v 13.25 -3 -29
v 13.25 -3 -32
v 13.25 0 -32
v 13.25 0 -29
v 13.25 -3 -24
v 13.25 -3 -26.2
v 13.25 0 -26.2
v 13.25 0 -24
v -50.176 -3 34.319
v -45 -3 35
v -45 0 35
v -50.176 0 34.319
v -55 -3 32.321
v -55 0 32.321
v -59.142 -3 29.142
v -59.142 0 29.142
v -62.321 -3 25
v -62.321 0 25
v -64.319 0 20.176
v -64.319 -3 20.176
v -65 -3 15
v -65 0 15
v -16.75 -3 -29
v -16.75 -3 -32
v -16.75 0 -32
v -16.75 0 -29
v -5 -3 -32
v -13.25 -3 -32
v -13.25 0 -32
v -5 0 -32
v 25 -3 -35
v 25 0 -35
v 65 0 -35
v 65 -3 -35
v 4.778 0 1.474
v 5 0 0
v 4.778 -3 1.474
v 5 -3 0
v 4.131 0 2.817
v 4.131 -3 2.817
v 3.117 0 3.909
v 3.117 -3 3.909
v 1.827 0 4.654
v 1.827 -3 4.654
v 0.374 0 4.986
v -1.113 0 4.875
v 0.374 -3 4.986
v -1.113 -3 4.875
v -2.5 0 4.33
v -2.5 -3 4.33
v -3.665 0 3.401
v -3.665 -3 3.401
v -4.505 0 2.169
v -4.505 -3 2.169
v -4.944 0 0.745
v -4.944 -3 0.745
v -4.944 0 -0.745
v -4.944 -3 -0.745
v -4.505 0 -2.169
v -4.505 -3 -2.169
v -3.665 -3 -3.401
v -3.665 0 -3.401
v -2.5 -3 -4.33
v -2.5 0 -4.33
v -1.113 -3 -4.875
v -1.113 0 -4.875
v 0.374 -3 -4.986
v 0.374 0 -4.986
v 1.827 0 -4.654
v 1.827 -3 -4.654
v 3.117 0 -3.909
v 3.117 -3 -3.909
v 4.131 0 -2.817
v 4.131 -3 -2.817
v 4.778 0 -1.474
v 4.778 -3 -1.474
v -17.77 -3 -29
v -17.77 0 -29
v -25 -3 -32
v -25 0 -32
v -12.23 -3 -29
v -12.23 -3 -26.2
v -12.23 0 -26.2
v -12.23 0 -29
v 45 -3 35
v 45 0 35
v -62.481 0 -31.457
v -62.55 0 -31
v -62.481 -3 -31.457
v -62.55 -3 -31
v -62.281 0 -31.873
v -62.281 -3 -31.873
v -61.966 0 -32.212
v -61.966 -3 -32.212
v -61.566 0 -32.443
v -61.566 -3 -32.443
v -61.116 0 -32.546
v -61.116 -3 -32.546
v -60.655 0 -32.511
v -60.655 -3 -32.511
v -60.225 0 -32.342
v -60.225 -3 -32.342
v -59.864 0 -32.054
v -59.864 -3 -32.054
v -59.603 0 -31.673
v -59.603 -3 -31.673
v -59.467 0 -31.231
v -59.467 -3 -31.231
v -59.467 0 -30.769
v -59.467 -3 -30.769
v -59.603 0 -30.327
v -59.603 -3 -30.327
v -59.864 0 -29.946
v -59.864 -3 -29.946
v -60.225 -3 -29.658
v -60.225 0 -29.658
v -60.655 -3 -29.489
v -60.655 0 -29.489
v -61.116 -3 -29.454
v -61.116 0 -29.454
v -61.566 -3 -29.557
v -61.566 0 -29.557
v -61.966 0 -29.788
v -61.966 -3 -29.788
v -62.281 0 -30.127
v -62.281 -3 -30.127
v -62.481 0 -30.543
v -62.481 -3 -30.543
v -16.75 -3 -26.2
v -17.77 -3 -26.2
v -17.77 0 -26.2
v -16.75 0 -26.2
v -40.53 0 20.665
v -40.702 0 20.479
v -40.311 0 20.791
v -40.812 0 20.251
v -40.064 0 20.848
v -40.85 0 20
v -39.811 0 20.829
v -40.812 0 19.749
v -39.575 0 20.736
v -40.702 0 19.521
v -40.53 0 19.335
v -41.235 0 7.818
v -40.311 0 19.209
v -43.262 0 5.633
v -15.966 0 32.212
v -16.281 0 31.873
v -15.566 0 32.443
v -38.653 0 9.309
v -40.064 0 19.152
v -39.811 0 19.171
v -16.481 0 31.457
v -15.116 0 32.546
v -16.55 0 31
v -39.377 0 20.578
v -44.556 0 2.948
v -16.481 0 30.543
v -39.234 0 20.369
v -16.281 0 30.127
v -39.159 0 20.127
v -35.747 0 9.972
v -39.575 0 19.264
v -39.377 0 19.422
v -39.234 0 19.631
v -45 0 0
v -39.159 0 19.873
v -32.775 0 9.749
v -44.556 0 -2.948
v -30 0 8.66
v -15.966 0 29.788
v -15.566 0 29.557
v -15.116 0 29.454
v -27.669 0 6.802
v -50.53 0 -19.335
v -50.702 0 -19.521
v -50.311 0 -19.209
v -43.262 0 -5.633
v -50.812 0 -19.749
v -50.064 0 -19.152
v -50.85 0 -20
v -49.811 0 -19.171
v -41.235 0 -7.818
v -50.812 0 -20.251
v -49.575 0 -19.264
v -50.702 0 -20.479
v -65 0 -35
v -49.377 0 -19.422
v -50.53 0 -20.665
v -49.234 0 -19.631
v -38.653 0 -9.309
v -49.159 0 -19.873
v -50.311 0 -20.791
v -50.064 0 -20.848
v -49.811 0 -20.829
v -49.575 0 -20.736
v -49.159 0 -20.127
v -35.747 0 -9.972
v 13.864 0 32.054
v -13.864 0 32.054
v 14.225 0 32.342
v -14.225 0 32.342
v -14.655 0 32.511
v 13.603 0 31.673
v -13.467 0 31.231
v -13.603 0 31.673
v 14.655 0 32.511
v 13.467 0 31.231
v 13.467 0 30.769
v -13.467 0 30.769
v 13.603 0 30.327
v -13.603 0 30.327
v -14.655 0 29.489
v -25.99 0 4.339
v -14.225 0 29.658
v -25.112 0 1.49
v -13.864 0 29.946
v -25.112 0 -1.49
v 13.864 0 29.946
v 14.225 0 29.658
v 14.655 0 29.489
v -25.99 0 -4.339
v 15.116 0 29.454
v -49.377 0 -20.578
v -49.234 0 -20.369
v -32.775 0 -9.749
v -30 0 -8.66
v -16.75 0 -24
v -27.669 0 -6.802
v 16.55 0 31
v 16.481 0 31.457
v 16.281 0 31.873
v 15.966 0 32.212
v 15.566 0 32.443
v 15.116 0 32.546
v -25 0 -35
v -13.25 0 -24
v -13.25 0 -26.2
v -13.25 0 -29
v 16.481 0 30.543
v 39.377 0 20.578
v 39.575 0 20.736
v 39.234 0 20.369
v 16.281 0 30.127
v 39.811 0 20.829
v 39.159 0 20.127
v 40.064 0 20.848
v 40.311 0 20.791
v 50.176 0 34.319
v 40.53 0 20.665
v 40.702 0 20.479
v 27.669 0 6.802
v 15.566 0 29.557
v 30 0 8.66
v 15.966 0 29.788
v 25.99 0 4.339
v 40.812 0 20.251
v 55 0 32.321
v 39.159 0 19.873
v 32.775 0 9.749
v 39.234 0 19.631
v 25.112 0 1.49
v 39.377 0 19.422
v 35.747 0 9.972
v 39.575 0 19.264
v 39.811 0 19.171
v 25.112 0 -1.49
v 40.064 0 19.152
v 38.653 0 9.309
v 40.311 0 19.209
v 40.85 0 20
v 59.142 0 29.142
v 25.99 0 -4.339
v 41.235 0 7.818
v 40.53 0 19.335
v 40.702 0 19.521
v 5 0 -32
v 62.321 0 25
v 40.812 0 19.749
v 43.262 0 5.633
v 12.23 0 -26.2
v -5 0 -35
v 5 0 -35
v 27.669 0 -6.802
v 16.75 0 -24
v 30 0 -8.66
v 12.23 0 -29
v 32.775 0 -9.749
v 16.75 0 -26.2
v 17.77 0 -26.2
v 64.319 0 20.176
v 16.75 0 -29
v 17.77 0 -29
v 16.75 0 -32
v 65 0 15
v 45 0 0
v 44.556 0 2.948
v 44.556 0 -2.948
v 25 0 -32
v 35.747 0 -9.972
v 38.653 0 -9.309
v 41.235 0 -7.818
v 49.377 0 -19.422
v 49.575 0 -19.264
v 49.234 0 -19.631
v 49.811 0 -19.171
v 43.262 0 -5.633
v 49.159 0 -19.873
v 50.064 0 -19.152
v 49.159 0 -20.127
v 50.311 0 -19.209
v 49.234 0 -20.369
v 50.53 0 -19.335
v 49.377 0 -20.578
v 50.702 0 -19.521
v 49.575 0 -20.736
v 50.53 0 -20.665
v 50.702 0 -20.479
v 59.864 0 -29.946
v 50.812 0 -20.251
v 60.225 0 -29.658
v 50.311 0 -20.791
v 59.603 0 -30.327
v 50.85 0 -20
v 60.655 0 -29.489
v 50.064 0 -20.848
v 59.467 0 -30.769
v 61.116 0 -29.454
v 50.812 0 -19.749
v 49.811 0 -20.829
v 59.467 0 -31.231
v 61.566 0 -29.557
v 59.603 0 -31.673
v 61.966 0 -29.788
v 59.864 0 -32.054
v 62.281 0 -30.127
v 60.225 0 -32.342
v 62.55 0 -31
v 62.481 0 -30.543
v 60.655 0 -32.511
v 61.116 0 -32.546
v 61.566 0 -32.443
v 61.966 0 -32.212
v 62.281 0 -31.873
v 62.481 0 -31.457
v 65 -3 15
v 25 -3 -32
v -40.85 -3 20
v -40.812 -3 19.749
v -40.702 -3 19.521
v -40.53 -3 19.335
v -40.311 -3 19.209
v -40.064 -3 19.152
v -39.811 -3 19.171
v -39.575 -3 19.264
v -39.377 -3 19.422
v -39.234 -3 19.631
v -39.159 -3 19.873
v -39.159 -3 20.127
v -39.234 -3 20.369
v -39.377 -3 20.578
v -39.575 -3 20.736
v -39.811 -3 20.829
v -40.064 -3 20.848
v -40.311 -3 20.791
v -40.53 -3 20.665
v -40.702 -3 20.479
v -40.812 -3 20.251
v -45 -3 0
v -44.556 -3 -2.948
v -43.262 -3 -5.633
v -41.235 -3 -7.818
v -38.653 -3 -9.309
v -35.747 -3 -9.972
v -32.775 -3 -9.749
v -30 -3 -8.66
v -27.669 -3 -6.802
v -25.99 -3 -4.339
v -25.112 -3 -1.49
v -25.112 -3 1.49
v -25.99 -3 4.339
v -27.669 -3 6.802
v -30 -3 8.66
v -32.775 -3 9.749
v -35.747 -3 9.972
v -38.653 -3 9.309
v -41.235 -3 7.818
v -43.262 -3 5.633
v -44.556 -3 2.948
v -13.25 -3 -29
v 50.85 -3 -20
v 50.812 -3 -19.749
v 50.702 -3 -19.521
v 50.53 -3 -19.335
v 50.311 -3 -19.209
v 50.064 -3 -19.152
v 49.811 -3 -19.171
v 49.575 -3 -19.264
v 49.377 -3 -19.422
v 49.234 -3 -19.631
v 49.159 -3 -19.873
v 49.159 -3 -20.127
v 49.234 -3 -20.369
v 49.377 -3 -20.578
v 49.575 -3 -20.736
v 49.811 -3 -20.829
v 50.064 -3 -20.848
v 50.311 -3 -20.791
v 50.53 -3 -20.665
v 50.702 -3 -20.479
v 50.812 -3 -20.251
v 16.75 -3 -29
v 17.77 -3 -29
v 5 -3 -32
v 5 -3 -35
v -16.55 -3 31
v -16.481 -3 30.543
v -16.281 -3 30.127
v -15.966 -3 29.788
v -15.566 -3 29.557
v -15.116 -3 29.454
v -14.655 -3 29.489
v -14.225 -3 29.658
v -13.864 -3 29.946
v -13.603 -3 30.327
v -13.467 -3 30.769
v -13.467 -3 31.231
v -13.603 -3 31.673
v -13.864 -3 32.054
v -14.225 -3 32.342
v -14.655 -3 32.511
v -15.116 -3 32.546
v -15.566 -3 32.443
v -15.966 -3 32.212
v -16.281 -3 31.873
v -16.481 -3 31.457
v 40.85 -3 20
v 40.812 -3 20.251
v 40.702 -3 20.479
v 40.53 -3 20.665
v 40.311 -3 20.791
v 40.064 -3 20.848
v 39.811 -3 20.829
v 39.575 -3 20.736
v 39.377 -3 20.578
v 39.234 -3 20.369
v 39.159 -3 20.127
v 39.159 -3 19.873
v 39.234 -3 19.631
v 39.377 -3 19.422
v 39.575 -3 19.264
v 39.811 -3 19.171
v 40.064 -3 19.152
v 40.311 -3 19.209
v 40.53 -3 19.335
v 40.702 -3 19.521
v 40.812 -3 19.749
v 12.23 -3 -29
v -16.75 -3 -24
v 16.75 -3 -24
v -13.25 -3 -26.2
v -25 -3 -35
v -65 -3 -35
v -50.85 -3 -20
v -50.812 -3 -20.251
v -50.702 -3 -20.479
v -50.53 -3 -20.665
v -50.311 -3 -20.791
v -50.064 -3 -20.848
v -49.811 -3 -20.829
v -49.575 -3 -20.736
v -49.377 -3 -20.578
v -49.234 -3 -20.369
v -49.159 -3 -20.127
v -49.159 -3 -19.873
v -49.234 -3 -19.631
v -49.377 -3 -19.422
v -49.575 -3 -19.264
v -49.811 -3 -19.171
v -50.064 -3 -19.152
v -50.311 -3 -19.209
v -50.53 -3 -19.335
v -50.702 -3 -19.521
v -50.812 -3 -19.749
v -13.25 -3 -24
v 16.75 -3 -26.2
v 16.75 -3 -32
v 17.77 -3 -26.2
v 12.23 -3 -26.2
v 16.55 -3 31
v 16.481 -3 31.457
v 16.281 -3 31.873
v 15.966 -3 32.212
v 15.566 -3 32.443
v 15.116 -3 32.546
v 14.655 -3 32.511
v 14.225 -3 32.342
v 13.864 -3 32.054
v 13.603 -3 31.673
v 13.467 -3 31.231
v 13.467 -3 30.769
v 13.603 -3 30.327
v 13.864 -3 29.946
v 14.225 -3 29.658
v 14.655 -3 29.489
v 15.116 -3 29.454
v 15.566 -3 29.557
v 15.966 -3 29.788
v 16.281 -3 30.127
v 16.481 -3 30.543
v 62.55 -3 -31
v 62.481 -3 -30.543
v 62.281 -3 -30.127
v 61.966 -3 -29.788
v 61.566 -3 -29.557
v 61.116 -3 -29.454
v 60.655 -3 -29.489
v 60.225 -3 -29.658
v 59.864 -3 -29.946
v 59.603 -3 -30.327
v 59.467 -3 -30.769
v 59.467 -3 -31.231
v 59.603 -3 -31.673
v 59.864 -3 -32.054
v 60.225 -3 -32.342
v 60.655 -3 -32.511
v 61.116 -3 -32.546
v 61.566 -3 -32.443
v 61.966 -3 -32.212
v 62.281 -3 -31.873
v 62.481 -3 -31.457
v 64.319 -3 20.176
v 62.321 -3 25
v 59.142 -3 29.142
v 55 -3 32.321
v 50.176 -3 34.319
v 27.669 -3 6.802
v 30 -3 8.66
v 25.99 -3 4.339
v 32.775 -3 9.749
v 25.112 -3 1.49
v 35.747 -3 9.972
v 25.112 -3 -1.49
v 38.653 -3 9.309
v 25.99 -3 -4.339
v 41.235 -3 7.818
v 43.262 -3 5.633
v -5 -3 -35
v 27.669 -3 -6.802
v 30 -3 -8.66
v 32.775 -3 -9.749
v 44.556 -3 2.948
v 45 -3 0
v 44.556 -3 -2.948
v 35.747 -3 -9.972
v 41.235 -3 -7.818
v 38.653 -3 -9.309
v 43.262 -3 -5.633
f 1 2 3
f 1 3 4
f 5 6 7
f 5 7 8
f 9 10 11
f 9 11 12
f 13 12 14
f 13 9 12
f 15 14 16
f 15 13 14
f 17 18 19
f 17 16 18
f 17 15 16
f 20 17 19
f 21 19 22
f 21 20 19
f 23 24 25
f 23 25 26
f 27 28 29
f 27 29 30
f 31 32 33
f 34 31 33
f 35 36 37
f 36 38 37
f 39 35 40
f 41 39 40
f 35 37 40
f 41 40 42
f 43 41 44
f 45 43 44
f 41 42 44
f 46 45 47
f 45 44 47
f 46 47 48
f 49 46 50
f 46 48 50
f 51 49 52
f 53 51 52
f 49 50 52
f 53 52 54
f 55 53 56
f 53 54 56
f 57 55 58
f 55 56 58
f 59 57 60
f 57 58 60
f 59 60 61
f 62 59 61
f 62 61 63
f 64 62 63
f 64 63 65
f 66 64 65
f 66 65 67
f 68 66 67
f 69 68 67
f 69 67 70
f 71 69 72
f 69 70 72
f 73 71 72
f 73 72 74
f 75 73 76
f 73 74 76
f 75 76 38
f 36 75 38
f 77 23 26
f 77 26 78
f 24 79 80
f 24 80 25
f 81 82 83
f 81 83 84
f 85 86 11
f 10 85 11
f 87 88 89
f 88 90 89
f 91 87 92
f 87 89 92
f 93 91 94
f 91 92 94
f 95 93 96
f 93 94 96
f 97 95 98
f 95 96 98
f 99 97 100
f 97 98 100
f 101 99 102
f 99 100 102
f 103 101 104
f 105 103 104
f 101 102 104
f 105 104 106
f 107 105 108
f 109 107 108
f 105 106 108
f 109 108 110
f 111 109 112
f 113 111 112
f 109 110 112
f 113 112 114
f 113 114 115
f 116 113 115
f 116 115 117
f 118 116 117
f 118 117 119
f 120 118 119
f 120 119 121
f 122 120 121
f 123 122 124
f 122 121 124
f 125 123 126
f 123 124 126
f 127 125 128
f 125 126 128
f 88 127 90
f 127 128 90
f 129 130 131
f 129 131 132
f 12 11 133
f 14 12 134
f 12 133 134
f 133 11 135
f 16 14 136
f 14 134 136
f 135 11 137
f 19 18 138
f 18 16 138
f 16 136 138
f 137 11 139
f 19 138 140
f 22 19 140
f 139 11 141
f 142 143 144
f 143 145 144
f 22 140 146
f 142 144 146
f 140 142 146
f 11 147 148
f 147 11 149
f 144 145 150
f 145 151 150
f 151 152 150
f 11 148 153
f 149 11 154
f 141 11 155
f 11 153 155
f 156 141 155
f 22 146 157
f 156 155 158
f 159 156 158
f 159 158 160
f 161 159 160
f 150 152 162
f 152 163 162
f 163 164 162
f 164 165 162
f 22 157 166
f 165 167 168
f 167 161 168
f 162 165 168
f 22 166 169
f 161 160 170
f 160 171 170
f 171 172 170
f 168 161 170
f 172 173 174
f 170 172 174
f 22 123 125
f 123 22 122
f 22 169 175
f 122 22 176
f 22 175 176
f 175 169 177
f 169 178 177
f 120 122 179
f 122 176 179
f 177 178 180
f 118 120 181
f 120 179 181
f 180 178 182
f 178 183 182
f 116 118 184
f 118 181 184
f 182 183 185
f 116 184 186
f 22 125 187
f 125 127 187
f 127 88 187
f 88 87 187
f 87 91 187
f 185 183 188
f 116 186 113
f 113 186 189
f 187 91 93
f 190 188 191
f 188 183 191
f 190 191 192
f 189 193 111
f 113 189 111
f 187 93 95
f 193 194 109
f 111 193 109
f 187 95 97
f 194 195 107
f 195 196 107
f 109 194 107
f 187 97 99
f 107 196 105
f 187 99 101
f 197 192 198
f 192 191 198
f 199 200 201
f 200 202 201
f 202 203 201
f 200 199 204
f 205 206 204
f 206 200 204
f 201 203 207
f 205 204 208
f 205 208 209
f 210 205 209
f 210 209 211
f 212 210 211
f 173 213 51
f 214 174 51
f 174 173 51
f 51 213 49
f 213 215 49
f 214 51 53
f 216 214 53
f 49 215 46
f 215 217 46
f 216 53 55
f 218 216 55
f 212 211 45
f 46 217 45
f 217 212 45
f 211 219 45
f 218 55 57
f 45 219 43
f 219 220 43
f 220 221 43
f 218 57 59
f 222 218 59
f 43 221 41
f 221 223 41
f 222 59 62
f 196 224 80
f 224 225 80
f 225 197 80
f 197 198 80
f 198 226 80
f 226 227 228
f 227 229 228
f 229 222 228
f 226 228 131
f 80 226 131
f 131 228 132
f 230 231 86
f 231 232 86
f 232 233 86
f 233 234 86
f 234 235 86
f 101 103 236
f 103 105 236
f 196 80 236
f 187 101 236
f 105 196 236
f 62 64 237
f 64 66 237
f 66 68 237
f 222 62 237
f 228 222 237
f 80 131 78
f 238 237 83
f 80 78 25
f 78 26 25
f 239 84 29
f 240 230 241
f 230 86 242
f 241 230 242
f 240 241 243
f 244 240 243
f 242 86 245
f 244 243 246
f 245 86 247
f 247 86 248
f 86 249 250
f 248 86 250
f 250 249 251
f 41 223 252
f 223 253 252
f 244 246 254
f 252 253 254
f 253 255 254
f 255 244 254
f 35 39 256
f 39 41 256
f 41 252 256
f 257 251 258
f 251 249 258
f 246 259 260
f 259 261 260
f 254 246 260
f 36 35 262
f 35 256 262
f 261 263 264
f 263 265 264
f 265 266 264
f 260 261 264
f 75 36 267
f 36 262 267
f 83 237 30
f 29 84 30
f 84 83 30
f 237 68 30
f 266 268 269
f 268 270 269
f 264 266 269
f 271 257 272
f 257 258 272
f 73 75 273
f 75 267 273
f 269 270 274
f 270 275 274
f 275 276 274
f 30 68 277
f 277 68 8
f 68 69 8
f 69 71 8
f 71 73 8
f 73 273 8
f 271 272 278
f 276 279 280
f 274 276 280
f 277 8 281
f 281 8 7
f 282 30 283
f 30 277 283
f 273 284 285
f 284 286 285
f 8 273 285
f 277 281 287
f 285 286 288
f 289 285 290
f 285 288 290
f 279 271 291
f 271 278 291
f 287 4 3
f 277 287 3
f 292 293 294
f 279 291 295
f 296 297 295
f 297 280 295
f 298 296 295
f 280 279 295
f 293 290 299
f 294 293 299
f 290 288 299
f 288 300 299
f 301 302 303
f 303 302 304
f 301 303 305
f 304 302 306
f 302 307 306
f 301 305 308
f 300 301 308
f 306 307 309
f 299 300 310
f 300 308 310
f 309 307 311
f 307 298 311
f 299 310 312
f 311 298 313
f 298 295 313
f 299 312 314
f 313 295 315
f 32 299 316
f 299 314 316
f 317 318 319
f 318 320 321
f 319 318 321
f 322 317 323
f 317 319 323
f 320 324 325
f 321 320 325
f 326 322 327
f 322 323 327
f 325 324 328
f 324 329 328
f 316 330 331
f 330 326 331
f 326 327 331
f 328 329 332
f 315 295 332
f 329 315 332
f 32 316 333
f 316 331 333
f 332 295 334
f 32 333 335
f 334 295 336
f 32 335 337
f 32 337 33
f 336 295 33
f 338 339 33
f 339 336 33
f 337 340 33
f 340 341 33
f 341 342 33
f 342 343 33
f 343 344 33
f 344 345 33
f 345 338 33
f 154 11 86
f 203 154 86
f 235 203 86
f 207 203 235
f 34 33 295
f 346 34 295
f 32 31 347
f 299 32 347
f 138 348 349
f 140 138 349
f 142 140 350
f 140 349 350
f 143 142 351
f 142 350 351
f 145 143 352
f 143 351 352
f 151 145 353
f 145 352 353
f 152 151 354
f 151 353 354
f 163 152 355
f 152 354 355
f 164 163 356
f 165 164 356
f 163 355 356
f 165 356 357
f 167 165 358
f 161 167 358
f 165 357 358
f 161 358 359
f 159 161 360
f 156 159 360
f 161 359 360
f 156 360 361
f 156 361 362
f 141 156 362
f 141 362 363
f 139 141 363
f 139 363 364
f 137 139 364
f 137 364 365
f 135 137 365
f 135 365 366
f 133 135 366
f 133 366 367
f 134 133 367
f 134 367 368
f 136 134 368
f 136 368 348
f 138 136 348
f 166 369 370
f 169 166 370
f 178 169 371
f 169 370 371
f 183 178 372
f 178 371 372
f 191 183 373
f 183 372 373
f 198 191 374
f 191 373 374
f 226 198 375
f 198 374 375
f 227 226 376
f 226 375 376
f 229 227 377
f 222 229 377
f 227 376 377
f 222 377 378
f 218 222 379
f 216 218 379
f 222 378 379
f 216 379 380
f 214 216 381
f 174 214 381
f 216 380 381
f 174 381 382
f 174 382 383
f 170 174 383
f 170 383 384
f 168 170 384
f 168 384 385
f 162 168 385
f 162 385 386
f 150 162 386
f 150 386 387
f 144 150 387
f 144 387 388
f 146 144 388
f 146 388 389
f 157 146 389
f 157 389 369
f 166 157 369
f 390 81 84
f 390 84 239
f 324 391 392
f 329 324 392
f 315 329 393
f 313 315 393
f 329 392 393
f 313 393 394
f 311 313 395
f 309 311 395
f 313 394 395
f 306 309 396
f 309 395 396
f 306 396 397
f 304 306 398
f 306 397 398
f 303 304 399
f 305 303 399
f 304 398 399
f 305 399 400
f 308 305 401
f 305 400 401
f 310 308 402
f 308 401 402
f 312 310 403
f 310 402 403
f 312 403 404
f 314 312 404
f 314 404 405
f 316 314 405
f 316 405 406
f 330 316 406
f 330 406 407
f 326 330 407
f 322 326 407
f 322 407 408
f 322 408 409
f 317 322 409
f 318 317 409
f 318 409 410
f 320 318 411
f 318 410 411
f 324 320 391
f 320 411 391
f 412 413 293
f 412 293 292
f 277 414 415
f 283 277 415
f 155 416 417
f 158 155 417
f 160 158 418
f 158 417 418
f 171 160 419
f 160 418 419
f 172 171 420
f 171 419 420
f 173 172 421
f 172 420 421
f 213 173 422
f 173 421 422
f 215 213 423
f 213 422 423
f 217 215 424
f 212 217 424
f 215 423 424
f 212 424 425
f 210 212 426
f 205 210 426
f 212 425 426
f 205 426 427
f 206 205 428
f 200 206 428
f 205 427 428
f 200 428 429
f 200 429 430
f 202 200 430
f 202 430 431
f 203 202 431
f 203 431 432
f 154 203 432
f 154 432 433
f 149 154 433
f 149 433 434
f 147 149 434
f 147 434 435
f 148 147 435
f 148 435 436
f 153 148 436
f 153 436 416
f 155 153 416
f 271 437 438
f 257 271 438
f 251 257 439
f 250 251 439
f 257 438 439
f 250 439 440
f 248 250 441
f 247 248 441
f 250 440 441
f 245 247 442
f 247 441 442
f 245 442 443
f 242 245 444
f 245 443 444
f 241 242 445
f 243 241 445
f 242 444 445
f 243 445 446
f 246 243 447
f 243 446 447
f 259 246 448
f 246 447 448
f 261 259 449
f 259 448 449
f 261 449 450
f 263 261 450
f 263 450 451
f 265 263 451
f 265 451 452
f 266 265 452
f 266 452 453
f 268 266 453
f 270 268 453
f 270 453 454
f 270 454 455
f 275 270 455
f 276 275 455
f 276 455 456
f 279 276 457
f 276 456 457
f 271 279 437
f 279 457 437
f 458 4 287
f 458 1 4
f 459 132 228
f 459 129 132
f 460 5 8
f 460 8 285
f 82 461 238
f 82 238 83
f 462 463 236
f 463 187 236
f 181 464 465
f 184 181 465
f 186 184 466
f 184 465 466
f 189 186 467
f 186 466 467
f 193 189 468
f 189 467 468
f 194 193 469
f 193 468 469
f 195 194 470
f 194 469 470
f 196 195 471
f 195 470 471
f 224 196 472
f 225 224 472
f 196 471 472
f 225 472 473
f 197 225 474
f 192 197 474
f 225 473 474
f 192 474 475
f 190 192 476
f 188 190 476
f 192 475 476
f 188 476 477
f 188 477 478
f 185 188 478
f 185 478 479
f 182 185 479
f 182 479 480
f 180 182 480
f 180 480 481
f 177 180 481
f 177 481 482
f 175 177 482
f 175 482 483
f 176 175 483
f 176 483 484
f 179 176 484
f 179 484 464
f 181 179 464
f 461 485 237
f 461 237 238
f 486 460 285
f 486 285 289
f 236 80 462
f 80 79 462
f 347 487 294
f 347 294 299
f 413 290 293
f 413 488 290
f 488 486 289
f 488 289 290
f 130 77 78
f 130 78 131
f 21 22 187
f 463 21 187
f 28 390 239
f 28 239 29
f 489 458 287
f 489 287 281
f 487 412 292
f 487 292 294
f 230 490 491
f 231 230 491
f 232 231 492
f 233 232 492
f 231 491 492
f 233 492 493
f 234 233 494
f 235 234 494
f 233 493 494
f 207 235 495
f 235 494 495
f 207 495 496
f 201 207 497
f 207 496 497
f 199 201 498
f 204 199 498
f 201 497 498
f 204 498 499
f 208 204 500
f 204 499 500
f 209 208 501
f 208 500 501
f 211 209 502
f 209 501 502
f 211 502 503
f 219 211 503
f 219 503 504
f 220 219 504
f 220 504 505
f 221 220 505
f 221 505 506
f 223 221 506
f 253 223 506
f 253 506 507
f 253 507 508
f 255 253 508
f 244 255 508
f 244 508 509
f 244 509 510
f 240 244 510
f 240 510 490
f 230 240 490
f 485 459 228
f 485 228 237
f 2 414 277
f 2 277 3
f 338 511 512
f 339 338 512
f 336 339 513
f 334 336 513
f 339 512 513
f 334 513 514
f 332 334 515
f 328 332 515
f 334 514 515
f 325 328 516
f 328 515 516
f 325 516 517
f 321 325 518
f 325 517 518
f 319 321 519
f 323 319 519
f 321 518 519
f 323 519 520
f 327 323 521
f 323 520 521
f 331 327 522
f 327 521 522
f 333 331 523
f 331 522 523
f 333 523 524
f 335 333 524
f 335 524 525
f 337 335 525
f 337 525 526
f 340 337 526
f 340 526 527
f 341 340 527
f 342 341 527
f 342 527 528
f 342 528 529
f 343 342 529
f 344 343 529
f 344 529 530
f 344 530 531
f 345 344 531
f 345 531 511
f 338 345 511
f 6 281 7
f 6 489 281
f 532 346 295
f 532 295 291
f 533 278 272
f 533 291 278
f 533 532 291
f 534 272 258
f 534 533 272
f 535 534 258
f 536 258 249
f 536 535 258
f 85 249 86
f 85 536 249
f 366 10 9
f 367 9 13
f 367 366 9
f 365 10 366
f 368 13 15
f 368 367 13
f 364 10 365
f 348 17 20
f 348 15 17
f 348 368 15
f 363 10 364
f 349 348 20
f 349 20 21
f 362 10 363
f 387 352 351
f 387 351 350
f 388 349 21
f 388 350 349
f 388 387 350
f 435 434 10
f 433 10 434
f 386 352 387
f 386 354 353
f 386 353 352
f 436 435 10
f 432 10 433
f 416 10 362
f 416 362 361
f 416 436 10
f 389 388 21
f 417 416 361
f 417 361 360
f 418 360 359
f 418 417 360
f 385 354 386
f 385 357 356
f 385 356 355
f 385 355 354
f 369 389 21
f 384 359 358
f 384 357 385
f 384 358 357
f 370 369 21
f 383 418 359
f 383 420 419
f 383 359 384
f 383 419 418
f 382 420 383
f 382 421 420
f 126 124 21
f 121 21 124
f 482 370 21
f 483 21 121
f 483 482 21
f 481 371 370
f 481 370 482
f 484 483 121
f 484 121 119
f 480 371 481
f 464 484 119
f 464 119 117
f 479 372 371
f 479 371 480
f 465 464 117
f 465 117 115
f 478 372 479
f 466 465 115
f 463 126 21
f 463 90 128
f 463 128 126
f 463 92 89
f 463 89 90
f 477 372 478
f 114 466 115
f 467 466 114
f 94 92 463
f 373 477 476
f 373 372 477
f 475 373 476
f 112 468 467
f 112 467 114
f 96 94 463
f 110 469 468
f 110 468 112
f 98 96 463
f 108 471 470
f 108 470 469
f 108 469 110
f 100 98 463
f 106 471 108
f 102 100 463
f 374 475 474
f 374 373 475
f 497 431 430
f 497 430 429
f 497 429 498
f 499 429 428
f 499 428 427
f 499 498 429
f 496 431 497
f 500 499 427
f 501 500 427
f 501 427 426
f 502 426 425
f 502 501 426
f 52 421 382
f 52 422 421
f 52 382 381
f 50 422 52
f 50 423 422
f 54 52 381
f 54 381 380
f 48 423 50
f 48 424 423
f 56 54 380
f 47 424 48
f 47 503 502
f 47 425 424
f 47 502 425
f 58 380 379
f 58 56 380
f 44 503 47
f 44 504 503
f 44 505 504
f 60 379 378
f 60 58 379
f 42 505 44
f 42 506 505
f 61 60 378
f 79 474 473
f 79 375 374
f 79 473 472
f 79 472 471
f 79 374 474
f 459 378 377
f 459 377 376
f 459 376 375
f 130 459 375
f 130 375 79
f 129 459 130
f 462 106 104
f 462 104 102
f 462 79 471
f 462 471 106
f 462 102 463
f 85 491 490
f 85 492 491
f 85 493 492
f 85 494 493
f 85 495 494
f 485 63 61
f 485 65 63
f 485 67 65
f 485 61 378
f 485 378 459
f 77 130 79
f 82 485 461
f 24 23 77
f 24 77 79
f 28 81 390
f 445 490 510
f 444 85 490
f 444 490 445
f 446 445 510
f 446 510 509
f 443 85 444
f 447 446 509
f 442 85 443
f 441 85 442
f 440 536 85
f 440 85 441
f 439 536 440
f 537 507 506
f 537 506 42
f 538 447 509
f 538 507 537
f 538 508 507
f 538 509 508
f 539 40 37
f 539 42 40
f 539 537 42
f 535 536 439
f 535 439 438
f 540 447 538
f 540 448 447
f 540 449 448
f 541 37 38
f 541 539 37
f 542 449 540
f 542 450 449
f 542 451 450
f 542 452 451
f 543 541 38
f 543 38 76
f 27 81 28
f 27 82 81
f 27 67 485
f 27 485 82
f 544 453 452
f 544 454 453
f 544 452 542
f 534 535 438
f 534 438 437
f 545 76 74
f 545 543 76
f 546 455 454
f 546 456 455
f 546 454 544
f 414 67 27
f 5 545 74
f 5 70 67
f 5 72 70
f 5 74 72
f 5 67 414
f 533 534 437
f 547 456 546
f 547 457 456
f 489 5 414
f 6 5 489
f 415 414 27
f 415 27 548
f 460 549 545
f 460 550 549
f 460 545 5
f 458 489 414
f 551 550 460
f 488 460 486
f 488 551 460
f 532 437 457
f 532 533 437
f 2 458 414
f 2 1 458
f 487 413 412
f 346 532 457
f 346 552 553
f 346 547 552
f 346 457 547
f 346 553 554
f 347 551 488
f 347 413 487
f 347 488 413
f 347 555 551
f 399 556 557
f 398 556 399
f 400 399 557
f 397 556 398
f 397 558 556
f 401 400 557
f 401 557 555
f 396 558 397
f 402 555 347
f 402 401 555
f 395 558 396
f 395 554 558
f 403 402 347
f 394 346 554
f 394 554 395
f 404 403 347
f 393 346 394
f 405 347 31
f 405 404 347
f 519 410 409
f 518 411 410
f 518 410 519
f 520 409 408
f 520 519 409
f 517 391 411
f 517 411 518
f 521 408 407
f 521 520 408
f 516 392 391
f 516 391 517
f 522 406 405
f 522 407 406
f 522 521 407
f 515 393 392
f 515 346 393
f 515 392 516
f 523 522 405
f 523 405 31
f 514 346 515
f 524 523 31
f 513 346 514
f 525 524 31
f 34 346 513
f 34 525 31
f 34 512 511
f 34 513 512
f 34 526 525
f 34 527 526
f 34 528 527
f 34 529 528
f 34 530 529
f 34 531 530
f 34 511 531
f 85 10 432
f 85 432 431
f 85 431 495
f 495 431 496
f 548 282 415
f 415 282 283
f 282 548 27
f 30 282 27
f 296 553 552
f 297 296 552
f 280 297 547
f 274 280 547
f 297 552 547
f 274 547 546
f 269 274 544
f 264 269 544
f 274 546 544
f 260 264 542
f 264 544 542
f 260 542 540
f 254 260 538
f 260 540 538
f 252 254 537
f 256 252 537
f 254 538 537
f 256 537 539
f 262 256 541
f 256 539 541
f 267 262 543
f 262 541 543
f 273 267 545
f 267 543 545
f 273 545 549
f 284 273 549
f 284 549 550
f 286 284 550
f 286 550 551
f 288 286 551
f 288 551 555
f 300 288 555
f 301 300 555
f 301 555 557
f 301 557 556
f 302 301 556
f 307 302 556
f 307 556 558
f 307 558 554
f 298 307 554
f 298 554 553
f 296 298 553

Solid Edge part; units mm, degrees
sketch "Sketch1" plane through (0, 0, 0) normal (0, -1, 0) x (1, 0, 0)
  line L0 (-65, -35) -> (65, -35)
  line L1 (65, -35) -> (65, 35)
  line L2 (65, 35) -> (-65, 35)
  line L3 (-65, 35) -> (-65, -35)
  dimension "D1" = 130
  dimension "D2" = 70
extrude "Ajout_matière_1" add sketch "Sketch1" along normal blind 3
sketch "Sketch2" plane through (0, -3, 0) normal (0, -1, 0) x (1, 0, 0)
  circle A0 centre (35, 0) radius 10
  dimension "D1" = 20
  dimension "D2" = 35
extrude "Enlèvement_matière_1" cut sketch "Sketch2" against normal blind 203.2796
sketch "Sketch3" plane through (0, -3, 0) normal (0, -1, 0) x (1, 0, 0)
  circle A0 centre (40, 20) radius 0.85
  circle A1 centre (15, 31) radius 1.55
  circle A2 centre (50, -20) radius 0.85
  circle A3 centre (61, -31) radius 1.55
  dimension "D1" = 25
  dimension "D2" = 20
  dimension "D3" = 1.7
  dimension "D4" = 20
  dimension "D5" = 15
  dimension "D6" = 1.7
  dimension "D7" = 3.1
  dimension "D8" = 15
  dimension "D9" = 4
  dimension "D10" = 3.1
  dimension "D11" = 4
  dimension "D12" = 4
extrude "Enlèvement_matière_2" cut sketch "Sketch3" against normal blind 33.5111
sketch "Sketch4" plane through (0, -3, 0) normal (0, -1, 0) x (1, 0, 0)
  line L0 (5, -32) -> (5, -38)
  line L1 (5, -38) -> (25, -38)
  line L2 (25, -38) -> (25, -32)
  line L3 (16.75, -32) -> (25, -32)
  line L4 (16.75, -29) -> (16.75, -32)
  line L5 (17.77, -29) -> (16.75, -29)
  line L6 (17.77, -26.2) -> (17.77, -29)
  line L7 (16.75, -26.2) -> (17.77, -26.2)
  line L8 (16.75, -24) -> (16.75, -26.2)
  line L9 (13.25, -24) -> (16.75, -24)
  line L10 (13.25, -26.2) -> (13.25, -24)
  line L11 (12.23, -26.2) -> (13.25, -26.2)
  line L12 (12.23, -29) -> (12.23, -26.2)
  line L13 (13.25, -29) -> (12.23, -29)
  line L14 (13.25, -32) -> (13.25, -29)
  line L15 (5, -32) -> (13.25, -32)
  dimension "D1" = 5
  dimension "D2" = 6
  dimension "D3" = 8
  dimension "D4" = 8.25
  dimension "D5" = 20
  dimension "D6" = 3
  dimension "D7" = 2.8
  dimension "D8" = 5.54
  dimension "D9" = 1.02
  dimension "D10" = 3.5
  dimension "D11" = 11
extrude "Cutout1" cut sketch "Sketch4" against normal blind 7.0408
mirror "Mirror1" about plane through (0, 0, 0) normal (1, 0, 0) of "Enlèvement_matière_2", "Enlèvement_matière_1", "Cutout1"
fillet "Round1" radius 20 2 edges at (-65, -1.5, 35) (65, -1.5, 35)
sketch "Sketch5" plane through (0, -3, 0) normal (0, -1, 0) x (1, 0, 0)
  circle A0 centre (0, 0) radius 5
  dimension "D1" = 10
extrude "Enlèvement_matière_5" cut sketch "Sketch5" against normal blind 16.0842
properties part number "06" material "MDF 3mm"
